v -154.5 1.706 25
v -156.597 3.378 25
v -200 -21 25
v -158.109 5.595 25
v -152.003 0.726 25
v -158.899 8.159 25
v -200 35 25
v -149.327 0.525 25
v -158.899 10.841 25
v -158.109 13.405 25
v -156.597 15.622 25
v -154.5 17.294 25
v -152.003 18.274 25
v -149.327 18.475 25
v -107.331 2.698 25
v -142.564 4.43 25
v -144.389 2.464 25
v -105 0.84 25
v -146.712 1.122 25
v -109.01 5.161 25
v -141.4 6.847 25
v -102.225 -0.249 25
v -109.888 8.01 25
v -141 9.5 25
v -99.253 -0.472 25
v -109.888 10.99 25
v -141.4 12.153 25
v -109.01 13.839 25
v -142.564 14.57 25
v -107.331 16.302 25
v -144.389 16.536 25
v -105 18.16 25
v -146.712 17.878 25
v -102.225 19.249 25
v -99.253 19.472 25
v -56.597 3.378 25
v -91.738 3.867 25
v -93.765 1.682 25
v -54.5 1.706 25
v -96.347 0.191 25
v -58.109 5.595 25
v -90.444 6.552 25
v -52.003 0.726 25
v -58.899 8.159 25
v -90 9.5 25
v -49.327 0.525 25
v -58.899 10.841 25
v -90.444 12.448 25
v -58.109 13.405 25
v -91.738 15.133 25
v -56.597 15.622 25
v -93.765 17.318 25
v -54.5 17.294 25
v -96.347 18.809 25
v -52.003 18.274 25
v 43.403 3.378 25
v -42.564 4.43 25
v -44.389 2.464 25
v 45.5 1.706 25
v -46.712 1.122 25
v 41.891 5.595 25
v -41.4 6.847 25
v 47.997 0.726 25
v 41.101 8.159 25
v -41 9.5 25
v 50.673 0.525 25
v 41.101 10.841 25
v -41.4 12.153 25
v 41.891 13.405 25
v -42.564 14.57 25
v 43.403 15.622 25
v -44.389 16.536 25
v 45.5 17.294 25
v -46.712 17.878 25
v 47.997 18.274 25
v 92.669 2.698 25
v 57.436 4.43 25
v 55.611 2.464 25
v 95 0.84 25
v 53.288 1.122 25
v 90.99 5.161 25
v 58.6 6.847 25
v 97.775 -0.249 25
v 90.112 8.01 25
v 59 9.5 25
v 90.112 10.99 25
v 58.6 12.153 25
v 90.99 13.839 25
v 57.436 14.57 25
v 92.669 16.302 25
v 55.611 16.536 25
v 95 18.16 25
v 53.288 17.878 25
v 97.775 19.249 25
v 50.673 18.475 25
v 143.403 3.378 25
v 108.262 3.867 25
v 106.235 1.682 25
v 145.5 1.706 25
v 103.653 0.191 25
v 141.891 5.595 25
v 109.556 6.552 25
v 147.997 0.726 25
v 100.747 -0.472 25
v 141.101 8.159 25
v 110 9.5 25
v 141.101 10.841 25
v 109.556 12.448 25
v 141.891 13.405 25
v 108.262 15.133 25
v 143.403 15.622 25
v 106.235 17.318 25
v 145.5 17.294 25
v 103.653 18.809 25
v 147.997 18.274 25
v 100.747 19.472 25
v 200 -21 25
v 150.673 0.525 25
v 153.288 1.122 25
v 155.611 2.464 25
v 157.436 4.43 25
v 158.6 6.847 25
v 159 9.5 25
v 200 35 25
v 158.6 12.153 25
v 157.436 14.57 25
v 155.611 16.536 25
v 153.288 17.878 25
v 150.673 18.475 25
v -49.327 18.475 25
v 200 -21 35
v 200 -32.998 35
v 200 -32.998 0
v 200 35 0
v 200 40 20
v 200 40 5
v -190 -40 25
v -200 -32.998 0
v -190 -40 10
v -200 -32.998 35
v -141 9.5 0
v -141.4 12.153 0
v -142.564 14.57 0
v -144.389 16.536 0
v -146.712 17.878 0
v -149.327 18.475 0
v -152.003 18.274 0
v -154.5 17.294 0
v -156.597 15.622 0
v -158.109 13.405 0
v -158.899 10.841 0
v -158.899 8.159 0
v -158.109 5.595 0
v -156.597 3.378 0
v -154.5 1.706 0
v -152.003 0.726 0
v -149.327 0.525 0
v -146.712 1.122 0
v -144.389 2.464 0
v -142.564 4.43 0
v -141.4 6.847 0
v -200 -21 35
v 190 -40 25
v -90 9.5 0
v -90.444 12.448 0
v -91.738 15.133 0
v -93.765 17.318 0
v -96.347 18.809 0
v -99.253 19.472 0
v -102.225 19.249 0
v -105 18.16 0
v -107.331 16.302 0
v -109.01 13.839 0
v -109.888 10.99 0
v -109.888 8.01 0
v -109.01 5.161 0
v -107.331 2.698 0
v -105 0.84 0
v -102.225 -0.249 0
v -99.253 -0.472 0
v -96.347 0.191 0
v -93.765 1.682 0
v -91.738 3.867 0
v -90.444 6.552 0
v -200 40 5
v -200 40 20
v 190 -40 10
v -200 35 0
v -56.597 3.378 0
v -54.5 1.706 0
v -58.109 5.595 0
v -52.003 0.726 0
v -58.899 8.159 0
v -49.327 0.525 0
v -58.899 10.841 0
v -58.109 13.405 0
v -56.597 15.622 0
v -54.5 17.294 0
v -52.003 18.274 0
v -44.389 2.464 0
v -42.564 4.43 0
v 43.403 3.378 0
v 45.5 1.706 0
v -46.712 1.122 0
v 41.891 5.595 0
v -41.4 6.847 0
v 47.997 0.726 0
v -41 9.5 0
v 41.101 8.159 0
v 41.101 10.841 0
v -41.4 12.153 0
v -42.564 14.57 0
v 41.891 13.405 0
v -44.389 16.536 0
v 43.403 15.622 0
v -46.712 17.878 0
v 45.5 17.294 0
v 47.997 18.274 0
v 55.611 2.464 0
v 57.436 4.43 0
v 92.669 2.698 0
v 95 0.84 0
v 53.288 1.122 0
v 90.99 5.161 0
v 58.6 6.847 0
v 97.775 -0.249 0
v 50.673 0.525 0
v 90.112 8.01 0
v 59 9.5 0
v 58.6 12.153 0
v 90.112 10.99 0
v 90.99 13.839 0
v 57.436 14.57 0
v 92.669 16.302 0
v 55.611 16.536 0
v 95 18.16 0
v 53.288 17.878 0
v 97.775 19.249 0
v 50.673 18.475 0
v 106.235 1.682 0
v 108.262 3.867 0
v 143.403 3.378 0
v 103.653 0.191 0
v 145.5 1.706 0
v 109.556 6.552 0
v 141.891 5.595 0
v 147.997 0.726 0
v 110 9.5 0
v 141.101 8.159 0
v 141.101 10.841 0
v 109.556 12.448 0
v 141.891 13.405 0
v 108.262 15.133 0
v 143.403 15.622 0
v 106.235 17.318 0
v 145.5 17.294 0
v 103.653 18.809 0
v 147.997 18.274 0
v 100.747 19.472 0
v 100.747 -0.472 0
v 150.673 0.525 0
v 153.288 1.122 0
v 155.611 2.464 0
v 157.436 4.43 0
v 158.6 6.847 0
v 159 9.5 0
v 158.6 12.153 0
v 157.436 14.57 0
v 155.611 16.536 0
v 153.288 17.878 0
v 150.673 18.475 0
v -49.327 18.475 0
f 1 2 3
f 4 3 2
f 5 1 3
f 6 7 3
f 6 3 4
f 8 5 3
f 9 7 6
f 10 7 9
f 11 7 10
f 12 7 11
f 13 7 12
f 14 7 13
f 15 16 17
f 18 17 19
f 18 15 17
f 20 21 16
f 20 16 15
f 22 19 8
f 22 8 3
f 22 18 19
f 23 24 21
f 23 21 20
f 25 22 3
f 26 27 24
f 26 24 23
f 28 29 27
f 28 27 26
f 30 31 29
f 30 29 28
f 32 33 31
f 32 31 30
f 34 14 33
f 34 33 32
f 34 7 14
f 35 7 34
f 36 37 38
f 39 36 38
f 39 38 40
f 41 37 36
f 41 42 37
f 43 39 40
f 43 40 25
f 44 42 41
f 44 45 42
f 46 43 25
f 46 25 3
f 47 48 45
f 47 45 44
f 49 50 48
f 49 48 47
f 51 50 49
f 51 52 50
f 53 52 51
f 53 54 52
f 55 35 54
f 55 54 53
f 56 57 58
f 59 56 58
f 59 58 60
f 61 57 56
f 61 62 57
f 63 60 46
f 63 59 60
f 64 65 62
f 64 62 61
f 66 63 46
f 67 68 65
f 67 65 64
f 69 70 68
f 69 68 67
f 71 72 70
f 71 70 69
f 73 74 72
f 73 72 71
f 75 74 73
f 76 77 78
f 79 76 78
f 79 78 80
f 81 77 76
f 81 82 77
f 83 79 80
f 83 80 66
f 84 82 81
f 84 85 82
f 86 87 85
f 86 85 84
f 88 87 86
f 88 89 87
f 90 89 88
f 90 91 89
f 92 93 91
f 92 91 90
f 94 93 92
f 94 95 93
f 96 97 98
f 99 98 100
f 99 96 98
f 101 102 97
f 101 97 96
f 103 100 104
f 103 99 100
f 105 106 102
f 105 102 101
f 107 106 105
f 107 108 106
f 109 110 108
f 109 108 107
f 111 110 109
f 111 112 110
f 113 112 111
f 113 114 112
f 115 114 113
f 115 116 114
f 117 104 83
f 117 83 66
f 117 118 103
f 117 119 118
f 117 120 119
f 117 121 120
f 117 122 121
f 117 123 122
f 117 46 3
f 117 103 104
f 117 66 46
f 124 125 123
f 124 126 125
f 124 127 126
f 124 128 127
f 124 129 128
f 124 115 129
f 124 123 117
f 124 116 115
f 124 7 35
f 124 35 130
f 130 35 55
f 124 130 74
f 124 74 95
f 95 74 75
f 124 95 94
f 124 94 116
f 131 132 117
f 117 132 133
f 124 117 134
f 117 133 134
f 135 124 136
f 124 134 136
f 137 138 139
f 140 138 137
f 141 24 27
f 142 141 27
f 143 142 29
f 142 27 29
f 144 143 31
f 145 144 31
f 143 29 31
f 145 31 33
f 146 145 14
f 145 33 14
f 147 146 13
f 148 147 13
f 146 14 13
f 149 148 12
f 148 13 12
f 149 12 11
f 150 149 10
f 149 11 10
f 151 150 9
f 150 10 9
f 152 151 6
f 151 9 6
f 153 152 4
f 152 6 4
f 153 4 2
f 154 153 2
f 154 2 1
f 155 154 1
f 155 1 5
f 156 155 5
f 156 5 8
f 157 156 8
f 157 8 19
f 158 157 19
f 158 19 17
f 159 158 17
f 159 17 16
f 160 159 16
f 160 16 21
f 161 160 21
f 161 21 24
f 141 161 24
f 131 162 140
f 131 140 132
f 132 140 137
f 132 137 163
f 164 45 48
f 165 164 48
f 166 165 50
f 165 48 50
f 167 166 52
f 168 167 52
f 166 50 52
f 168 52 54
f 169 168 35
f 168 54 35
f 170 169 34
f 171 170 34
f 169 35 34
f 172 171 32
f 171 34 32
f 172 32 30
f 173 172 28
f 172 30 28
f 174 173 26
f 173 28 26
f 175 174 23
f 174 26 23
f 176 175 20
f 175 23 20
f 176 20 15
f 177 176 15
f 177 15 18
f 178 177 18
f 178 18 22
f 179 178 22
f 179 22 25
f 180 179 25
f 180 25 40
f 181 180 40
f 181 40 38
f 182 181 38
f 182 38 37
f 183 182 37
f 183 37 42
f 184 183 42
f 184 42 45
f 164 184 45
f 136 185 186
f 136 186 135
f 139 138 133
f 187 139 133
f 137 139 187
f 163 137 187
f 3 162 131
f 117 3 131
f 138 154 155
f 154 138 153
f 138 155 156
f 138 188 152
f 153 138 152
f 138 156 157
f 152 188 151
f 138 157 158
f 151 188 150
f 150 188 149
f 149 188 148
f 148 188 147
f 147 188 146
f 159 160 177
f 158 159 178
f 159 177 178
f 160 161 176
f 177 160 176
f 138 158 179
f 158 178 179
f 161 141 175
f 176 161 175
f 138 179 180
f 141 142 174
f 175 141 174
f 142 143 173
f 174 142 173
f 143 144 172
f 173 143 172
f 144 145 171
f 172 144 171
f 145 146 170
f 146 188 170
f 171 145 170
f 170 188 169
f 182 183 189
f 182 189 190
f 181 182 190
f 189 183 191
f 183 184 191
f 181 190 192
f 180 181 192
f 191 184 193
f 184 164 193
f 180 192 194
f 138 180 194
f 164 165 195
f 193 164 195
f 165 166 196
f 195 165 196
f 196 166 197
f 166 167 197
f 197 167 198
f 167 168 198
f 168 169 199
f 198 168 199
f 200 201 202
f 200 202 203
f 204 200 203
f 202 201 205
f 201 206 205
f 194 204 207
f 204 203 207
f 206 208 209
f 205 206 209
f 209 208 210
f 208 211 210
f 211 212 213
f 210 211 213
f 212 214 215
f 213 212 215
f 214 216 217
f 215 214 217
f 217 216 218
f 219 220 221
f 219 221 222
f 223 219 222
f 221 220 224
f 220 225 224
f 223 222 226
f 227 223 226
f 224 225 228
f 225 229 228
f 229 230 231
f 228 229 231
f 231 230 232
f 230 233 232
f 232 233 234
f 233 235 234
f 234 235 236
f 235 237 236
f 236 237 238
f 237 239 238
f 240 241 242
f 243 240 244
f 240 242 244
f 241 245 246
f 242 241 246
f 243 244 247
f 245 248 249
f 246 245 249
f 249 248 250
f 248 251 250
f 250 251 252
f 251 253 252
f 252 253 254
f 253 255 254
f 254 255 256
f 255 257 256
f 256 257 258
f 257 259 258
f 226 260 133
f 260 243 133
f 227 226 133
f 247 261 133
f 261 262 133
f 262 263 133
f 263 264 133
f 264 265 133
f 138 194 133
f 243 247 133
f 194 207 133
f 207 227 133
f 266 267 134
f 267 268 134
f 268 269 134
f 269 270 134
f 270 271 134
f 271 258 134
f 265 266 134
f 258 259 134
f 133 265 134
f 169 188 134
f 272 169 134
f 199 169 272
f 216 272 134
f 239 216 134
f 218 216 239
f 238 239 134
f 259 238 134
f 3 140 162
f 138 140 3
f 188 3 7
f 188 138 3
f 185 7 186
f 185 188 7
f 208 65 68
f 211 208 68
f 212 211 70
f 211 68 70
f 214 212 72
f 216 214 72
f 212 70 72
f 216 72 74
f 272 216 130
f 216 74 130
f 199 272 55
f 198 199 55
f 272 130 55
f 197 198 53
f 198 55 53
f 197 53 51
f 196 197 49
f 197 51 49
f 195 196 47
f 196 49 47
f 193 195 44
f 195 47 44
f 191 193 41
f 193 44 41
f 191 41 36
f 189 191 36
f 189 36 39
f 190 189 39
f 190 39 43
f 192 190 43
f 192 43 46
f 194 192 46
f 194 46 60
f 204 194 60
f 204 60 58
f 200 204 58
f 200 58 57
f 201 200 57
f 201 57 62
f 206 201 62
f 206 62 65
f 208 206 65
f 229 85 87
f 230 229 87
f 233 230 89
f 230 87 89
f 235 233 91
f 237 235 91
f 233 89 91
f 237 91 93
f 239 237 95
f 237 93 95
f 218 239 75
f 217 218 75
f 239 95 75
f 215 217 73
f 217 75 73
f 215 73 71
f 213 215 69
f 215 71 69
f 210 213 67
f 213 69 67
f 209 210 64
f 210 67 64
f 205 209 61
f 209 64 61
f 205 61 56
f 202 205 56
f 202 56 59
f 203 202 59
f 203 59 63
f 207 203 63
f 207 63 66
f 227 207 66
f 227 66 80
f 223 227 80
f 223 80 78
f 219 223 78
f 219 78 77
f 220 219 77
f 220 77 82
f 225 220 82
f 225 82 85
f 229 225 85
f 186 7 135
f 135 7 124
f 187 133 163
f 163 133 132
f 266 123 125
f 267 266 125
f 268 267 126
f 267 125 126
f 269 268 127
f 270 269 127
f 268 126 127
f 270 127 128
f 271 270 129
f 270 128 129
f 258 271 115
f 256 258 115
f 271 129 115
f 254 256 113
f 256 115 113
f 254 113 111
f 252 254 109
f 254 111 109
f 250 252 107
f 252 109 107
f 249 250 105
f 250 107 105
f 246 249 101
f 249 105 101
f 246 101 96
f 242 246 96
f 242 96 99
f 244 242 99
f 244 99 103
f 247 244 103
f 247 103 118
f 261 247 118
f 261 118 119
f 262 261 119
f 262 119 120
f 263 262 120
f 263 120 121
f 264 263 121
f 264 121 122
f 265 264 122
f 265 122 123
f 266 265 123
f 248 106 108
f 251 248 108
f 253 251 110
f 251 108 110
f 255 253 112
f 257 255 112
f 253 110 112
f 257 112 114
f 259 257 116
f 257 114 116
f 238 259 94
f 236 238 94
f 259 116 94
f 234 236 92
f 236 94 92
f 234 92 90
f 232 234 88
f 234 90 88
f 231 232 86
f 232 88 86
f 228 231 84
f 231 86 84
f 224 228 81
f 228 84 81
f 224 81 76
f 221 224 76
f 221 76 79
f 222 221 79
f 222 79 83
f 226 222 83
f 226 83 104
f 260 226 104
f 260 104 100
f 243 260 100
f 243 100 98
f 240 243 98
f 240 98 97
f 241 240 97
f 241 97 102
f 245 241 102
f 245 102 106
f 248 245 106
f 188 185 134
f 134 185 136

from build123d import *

# Parameters (mm, degrees)
SKETCH_1_W          = 400
SKETCH_1_H          = 80
EXTRUDE_1_DEPTH     = 35
SKETCH_2_W          = 400
SKETCH_2_H          = 61
CUT_EXTRUDE_1_DEPTH = 10
CHAMFER_1_SIZE      = 5
CHAMFER_2_SIZE      = 10
CHAMFER_2_SIZE2     = 7.002075382
CHAMFER_3_SIZE      = 10
CHAMFER_3_SIZE2     = 7.002075382
CHAMFER_4_SIZE      = 10
CHAMFER_4_SIZE2     = 7.002075382
CHAMFER_5_SIZE      = 10
CHAMFER_5_SIZE2     = 7.002075382
CUT_EXTRUDE_2_REACH = 207.487
SKETCH_3_R          = 9
SKETCH_3_R_2        = 10


with BuildPart() as part:
    # 草图1 → 凸台-拉伸1 (new body)
    with BuildSketch(Plane.XY):
        Rectangle(SKETCH_1_W, SKETCH_1_H)
    extrude(amount=EXTRUDE_1_DEPTH)

    # 草图2 → 切除-拉伸1 (cut)
    with BuildSketch(Plane.XY.offset(35)):
        with Locations((0, 9.5)):
            Rectangle(SKETCH_2_W, SKETCH_2_H)
    extrude(amount=-CUT_EXTRUDE_1_DEPTH, mode=Mode.SUBTRACT)

    # 倒角1
    chamfer_1_edges = [part.edges().sort_by_distance(p)[0] for p in [
        (0, 40, 25),
        (0, 40, 0),
    ]]
    chamfer(chamfer_1_edges, length=CHAMFER_1_SIZE)

    # 倒角2
    chamfer_2_edges = [part.edges().sort_by_distance(p)[0] for p in [
        (0, -40, 35),
    ]]
    chamfer_2_side = [part.faces().sort_by_distance(p)[0] for p in [
        (0, -40, 17.5),
    ]]
    chamfer(chamfer_2_edges, length=CHAMFER_2_SIZE, length2=CHAMFER_2_SIZE2, reference=chamfer_2_side[0])

    # 倒角3
    chamfer_3_edges = [part.edges().sort_by_distance(p)[0] for p in [
        (0, -40, 0),
    ]]
    chamfer_3_side = [part.faces().sort_by_distance(p)[0] for p in [
        (0, -40, 12.5),
    ]]
    chamfer(chamfer_3_edges, length=CHAMFER_3_SIZE, length2=CHAMFER_3_SIZE2, reference=chamfer_3_side[0])

    # 倒角4
    chamfer_4_edges = [part.edges().sort_by_distance(p)[0] for p in [
        (-200, -40, 17.5),
    ]]
    chamfer_4_side = [part.faces().sort_by_distance(p)[0] for p in [
        (0, -40, 17.5),
    ]]
    chamfer(chamfer_4_edges, length=CHAMFER_4_SIZE, length2=CHAMFER_4_SIZE2, reference=chamfer_4_side[0])

    # 倒角5
    chamfer_5_edges = [part.edges().sort_by_distance(p)[0] for p in [
        (200, -40, 17.5),
    ]]
    chamfer_5_side = [part.faces().sort_by_distance(p)[0] for p in [
        (5, -40, 17.5),
    ]]
    chamfer(chamfer_5_edges, length=CHAMFER_5_SIZE, length2=CHAMFER_5_SIZE2, reference=chamfer_5_side[0])

    # 草图3 → 切除-拉伸2 (cut, up to next)
    with BuildSketch(Plane.XY.offset(25), mode=Mode.PRIVATE) as cut_extrude_2_sk1:
        with Locations((-150, 9.5)):
            Circle(SKETCH_3_R)
    cut_extrude_2_tool1 = extrude(cut_extrude_2_sk1.sketch, amount=-CUT_EXTRUDE_2_REACH, mode=Mode.PRIVATE) & part.part
    # 草图3 → 切除-拉伸2 (cut, up to next)
    with BuildSketch(Plane.XY.offset(25), mode=Mode.PRIVATE) as cut_extrude_2_sk2:
        with Locations((-100, 9.5)):
            Circle(SKETCH_3_R_2)
    cut_extrude_2_tool2 = extrude(cut_extrude_2_sk2.sketch, amount=-CUT_EXTRUDE_2_REACH, mode=Mode.PRIVATE) & part.part
    # 草图3 → 切除-拉伸2 (cut, up to next)
    with BuildSketch(Plane.XY.offset(25), mode=Mode.PRIVATE) as cut_extrude_2_sk3:
        with Locations((-50, 9.5)):
            Circle(SKETCH_3_R)
    cut_extrude_2_tool3 = extrude(cut_extrude_2_sk3.sketch, amount=-CUT_EXTRUDE_2_REACH, mode=Mode.PRIVATE) & part.part
    # 草图3 → 切除-拉伸2 (cut, up to next)
    with BuildSketch(Plane.XY.offset(25), mode=Mode.PRIVATE) as cut_extrude_2_sk4:
        with Locations((50, 9.5)):
            Circle(SKETCH_3_R)
    cut_extrude_2_tool4 = extrude(cut_extrude_2_sk4.sketch, amount=-CUT_EXTRUDE_2_REACH, mode=Mode.PRIVATE) & part.part
    # 草图3 → 切除-拉伸2 (cut, up to next)
    with BuildSketch(Plane.XY.offset(25), mode=Mode.PRIVATE) as cut_extrude_2_sk5:
        with Locations((100, 9.5)):
            Circle(SKETCH_3_R_2)
    cut_extrude_2_tool5 = extrude(cut_extrude_2_sk5.sketch, amount=-CUT_EXTRUDE_2_REACH, mode=Mode.PRIVATE) & part.part
    # 草图3 → 切除-拉伸2 (cut, up to next)
    with BuildSketch(Plane.XY.offset(25), mode=Mode.PRIVATE) as cut_extrude_2_sk6:
        with Locations((150, 9.5)):
            Circle(SKETCH_3_R)
    cut_extrude_2_tool6 = extrude(cut_extrude_2_sk6.sketch, amount=-CUT_EXTRUDE_2_REACH, mode=Mode.PRIVATE) & part.part
    add(cut_extrude_2_tool1.solids().sort_by_distance((-150, 9.5, 25))[0], mode=Mode.SUBTRACT)
    add(cut_extrude_2_tool2.solids().sort_by_distance((-100, 9.5, 25))[0], mode=Mode.SUBTRACT)
    add(cut_extrude_2_tool3.solids().sort_by_distance((-50, 9.5, 25))[0], mode=Mode.SUBTRACT)
    add(cut_extrude_2_tool4.solids().sort_by_distance((50, 9.5, 25))[0], mode=Mode.SUBTRACT)
    add(cut_extrude_2_tool5.solids().sort_by_distance((100, 9.5, 25))[0], mode=Mode.SUBTRACT)
    add(cut_extrude_2_tool6.solids().sort_by_distance((150, 9.5, 25))[0], mode=Mode.SUBTRACT)


solid = part.part
